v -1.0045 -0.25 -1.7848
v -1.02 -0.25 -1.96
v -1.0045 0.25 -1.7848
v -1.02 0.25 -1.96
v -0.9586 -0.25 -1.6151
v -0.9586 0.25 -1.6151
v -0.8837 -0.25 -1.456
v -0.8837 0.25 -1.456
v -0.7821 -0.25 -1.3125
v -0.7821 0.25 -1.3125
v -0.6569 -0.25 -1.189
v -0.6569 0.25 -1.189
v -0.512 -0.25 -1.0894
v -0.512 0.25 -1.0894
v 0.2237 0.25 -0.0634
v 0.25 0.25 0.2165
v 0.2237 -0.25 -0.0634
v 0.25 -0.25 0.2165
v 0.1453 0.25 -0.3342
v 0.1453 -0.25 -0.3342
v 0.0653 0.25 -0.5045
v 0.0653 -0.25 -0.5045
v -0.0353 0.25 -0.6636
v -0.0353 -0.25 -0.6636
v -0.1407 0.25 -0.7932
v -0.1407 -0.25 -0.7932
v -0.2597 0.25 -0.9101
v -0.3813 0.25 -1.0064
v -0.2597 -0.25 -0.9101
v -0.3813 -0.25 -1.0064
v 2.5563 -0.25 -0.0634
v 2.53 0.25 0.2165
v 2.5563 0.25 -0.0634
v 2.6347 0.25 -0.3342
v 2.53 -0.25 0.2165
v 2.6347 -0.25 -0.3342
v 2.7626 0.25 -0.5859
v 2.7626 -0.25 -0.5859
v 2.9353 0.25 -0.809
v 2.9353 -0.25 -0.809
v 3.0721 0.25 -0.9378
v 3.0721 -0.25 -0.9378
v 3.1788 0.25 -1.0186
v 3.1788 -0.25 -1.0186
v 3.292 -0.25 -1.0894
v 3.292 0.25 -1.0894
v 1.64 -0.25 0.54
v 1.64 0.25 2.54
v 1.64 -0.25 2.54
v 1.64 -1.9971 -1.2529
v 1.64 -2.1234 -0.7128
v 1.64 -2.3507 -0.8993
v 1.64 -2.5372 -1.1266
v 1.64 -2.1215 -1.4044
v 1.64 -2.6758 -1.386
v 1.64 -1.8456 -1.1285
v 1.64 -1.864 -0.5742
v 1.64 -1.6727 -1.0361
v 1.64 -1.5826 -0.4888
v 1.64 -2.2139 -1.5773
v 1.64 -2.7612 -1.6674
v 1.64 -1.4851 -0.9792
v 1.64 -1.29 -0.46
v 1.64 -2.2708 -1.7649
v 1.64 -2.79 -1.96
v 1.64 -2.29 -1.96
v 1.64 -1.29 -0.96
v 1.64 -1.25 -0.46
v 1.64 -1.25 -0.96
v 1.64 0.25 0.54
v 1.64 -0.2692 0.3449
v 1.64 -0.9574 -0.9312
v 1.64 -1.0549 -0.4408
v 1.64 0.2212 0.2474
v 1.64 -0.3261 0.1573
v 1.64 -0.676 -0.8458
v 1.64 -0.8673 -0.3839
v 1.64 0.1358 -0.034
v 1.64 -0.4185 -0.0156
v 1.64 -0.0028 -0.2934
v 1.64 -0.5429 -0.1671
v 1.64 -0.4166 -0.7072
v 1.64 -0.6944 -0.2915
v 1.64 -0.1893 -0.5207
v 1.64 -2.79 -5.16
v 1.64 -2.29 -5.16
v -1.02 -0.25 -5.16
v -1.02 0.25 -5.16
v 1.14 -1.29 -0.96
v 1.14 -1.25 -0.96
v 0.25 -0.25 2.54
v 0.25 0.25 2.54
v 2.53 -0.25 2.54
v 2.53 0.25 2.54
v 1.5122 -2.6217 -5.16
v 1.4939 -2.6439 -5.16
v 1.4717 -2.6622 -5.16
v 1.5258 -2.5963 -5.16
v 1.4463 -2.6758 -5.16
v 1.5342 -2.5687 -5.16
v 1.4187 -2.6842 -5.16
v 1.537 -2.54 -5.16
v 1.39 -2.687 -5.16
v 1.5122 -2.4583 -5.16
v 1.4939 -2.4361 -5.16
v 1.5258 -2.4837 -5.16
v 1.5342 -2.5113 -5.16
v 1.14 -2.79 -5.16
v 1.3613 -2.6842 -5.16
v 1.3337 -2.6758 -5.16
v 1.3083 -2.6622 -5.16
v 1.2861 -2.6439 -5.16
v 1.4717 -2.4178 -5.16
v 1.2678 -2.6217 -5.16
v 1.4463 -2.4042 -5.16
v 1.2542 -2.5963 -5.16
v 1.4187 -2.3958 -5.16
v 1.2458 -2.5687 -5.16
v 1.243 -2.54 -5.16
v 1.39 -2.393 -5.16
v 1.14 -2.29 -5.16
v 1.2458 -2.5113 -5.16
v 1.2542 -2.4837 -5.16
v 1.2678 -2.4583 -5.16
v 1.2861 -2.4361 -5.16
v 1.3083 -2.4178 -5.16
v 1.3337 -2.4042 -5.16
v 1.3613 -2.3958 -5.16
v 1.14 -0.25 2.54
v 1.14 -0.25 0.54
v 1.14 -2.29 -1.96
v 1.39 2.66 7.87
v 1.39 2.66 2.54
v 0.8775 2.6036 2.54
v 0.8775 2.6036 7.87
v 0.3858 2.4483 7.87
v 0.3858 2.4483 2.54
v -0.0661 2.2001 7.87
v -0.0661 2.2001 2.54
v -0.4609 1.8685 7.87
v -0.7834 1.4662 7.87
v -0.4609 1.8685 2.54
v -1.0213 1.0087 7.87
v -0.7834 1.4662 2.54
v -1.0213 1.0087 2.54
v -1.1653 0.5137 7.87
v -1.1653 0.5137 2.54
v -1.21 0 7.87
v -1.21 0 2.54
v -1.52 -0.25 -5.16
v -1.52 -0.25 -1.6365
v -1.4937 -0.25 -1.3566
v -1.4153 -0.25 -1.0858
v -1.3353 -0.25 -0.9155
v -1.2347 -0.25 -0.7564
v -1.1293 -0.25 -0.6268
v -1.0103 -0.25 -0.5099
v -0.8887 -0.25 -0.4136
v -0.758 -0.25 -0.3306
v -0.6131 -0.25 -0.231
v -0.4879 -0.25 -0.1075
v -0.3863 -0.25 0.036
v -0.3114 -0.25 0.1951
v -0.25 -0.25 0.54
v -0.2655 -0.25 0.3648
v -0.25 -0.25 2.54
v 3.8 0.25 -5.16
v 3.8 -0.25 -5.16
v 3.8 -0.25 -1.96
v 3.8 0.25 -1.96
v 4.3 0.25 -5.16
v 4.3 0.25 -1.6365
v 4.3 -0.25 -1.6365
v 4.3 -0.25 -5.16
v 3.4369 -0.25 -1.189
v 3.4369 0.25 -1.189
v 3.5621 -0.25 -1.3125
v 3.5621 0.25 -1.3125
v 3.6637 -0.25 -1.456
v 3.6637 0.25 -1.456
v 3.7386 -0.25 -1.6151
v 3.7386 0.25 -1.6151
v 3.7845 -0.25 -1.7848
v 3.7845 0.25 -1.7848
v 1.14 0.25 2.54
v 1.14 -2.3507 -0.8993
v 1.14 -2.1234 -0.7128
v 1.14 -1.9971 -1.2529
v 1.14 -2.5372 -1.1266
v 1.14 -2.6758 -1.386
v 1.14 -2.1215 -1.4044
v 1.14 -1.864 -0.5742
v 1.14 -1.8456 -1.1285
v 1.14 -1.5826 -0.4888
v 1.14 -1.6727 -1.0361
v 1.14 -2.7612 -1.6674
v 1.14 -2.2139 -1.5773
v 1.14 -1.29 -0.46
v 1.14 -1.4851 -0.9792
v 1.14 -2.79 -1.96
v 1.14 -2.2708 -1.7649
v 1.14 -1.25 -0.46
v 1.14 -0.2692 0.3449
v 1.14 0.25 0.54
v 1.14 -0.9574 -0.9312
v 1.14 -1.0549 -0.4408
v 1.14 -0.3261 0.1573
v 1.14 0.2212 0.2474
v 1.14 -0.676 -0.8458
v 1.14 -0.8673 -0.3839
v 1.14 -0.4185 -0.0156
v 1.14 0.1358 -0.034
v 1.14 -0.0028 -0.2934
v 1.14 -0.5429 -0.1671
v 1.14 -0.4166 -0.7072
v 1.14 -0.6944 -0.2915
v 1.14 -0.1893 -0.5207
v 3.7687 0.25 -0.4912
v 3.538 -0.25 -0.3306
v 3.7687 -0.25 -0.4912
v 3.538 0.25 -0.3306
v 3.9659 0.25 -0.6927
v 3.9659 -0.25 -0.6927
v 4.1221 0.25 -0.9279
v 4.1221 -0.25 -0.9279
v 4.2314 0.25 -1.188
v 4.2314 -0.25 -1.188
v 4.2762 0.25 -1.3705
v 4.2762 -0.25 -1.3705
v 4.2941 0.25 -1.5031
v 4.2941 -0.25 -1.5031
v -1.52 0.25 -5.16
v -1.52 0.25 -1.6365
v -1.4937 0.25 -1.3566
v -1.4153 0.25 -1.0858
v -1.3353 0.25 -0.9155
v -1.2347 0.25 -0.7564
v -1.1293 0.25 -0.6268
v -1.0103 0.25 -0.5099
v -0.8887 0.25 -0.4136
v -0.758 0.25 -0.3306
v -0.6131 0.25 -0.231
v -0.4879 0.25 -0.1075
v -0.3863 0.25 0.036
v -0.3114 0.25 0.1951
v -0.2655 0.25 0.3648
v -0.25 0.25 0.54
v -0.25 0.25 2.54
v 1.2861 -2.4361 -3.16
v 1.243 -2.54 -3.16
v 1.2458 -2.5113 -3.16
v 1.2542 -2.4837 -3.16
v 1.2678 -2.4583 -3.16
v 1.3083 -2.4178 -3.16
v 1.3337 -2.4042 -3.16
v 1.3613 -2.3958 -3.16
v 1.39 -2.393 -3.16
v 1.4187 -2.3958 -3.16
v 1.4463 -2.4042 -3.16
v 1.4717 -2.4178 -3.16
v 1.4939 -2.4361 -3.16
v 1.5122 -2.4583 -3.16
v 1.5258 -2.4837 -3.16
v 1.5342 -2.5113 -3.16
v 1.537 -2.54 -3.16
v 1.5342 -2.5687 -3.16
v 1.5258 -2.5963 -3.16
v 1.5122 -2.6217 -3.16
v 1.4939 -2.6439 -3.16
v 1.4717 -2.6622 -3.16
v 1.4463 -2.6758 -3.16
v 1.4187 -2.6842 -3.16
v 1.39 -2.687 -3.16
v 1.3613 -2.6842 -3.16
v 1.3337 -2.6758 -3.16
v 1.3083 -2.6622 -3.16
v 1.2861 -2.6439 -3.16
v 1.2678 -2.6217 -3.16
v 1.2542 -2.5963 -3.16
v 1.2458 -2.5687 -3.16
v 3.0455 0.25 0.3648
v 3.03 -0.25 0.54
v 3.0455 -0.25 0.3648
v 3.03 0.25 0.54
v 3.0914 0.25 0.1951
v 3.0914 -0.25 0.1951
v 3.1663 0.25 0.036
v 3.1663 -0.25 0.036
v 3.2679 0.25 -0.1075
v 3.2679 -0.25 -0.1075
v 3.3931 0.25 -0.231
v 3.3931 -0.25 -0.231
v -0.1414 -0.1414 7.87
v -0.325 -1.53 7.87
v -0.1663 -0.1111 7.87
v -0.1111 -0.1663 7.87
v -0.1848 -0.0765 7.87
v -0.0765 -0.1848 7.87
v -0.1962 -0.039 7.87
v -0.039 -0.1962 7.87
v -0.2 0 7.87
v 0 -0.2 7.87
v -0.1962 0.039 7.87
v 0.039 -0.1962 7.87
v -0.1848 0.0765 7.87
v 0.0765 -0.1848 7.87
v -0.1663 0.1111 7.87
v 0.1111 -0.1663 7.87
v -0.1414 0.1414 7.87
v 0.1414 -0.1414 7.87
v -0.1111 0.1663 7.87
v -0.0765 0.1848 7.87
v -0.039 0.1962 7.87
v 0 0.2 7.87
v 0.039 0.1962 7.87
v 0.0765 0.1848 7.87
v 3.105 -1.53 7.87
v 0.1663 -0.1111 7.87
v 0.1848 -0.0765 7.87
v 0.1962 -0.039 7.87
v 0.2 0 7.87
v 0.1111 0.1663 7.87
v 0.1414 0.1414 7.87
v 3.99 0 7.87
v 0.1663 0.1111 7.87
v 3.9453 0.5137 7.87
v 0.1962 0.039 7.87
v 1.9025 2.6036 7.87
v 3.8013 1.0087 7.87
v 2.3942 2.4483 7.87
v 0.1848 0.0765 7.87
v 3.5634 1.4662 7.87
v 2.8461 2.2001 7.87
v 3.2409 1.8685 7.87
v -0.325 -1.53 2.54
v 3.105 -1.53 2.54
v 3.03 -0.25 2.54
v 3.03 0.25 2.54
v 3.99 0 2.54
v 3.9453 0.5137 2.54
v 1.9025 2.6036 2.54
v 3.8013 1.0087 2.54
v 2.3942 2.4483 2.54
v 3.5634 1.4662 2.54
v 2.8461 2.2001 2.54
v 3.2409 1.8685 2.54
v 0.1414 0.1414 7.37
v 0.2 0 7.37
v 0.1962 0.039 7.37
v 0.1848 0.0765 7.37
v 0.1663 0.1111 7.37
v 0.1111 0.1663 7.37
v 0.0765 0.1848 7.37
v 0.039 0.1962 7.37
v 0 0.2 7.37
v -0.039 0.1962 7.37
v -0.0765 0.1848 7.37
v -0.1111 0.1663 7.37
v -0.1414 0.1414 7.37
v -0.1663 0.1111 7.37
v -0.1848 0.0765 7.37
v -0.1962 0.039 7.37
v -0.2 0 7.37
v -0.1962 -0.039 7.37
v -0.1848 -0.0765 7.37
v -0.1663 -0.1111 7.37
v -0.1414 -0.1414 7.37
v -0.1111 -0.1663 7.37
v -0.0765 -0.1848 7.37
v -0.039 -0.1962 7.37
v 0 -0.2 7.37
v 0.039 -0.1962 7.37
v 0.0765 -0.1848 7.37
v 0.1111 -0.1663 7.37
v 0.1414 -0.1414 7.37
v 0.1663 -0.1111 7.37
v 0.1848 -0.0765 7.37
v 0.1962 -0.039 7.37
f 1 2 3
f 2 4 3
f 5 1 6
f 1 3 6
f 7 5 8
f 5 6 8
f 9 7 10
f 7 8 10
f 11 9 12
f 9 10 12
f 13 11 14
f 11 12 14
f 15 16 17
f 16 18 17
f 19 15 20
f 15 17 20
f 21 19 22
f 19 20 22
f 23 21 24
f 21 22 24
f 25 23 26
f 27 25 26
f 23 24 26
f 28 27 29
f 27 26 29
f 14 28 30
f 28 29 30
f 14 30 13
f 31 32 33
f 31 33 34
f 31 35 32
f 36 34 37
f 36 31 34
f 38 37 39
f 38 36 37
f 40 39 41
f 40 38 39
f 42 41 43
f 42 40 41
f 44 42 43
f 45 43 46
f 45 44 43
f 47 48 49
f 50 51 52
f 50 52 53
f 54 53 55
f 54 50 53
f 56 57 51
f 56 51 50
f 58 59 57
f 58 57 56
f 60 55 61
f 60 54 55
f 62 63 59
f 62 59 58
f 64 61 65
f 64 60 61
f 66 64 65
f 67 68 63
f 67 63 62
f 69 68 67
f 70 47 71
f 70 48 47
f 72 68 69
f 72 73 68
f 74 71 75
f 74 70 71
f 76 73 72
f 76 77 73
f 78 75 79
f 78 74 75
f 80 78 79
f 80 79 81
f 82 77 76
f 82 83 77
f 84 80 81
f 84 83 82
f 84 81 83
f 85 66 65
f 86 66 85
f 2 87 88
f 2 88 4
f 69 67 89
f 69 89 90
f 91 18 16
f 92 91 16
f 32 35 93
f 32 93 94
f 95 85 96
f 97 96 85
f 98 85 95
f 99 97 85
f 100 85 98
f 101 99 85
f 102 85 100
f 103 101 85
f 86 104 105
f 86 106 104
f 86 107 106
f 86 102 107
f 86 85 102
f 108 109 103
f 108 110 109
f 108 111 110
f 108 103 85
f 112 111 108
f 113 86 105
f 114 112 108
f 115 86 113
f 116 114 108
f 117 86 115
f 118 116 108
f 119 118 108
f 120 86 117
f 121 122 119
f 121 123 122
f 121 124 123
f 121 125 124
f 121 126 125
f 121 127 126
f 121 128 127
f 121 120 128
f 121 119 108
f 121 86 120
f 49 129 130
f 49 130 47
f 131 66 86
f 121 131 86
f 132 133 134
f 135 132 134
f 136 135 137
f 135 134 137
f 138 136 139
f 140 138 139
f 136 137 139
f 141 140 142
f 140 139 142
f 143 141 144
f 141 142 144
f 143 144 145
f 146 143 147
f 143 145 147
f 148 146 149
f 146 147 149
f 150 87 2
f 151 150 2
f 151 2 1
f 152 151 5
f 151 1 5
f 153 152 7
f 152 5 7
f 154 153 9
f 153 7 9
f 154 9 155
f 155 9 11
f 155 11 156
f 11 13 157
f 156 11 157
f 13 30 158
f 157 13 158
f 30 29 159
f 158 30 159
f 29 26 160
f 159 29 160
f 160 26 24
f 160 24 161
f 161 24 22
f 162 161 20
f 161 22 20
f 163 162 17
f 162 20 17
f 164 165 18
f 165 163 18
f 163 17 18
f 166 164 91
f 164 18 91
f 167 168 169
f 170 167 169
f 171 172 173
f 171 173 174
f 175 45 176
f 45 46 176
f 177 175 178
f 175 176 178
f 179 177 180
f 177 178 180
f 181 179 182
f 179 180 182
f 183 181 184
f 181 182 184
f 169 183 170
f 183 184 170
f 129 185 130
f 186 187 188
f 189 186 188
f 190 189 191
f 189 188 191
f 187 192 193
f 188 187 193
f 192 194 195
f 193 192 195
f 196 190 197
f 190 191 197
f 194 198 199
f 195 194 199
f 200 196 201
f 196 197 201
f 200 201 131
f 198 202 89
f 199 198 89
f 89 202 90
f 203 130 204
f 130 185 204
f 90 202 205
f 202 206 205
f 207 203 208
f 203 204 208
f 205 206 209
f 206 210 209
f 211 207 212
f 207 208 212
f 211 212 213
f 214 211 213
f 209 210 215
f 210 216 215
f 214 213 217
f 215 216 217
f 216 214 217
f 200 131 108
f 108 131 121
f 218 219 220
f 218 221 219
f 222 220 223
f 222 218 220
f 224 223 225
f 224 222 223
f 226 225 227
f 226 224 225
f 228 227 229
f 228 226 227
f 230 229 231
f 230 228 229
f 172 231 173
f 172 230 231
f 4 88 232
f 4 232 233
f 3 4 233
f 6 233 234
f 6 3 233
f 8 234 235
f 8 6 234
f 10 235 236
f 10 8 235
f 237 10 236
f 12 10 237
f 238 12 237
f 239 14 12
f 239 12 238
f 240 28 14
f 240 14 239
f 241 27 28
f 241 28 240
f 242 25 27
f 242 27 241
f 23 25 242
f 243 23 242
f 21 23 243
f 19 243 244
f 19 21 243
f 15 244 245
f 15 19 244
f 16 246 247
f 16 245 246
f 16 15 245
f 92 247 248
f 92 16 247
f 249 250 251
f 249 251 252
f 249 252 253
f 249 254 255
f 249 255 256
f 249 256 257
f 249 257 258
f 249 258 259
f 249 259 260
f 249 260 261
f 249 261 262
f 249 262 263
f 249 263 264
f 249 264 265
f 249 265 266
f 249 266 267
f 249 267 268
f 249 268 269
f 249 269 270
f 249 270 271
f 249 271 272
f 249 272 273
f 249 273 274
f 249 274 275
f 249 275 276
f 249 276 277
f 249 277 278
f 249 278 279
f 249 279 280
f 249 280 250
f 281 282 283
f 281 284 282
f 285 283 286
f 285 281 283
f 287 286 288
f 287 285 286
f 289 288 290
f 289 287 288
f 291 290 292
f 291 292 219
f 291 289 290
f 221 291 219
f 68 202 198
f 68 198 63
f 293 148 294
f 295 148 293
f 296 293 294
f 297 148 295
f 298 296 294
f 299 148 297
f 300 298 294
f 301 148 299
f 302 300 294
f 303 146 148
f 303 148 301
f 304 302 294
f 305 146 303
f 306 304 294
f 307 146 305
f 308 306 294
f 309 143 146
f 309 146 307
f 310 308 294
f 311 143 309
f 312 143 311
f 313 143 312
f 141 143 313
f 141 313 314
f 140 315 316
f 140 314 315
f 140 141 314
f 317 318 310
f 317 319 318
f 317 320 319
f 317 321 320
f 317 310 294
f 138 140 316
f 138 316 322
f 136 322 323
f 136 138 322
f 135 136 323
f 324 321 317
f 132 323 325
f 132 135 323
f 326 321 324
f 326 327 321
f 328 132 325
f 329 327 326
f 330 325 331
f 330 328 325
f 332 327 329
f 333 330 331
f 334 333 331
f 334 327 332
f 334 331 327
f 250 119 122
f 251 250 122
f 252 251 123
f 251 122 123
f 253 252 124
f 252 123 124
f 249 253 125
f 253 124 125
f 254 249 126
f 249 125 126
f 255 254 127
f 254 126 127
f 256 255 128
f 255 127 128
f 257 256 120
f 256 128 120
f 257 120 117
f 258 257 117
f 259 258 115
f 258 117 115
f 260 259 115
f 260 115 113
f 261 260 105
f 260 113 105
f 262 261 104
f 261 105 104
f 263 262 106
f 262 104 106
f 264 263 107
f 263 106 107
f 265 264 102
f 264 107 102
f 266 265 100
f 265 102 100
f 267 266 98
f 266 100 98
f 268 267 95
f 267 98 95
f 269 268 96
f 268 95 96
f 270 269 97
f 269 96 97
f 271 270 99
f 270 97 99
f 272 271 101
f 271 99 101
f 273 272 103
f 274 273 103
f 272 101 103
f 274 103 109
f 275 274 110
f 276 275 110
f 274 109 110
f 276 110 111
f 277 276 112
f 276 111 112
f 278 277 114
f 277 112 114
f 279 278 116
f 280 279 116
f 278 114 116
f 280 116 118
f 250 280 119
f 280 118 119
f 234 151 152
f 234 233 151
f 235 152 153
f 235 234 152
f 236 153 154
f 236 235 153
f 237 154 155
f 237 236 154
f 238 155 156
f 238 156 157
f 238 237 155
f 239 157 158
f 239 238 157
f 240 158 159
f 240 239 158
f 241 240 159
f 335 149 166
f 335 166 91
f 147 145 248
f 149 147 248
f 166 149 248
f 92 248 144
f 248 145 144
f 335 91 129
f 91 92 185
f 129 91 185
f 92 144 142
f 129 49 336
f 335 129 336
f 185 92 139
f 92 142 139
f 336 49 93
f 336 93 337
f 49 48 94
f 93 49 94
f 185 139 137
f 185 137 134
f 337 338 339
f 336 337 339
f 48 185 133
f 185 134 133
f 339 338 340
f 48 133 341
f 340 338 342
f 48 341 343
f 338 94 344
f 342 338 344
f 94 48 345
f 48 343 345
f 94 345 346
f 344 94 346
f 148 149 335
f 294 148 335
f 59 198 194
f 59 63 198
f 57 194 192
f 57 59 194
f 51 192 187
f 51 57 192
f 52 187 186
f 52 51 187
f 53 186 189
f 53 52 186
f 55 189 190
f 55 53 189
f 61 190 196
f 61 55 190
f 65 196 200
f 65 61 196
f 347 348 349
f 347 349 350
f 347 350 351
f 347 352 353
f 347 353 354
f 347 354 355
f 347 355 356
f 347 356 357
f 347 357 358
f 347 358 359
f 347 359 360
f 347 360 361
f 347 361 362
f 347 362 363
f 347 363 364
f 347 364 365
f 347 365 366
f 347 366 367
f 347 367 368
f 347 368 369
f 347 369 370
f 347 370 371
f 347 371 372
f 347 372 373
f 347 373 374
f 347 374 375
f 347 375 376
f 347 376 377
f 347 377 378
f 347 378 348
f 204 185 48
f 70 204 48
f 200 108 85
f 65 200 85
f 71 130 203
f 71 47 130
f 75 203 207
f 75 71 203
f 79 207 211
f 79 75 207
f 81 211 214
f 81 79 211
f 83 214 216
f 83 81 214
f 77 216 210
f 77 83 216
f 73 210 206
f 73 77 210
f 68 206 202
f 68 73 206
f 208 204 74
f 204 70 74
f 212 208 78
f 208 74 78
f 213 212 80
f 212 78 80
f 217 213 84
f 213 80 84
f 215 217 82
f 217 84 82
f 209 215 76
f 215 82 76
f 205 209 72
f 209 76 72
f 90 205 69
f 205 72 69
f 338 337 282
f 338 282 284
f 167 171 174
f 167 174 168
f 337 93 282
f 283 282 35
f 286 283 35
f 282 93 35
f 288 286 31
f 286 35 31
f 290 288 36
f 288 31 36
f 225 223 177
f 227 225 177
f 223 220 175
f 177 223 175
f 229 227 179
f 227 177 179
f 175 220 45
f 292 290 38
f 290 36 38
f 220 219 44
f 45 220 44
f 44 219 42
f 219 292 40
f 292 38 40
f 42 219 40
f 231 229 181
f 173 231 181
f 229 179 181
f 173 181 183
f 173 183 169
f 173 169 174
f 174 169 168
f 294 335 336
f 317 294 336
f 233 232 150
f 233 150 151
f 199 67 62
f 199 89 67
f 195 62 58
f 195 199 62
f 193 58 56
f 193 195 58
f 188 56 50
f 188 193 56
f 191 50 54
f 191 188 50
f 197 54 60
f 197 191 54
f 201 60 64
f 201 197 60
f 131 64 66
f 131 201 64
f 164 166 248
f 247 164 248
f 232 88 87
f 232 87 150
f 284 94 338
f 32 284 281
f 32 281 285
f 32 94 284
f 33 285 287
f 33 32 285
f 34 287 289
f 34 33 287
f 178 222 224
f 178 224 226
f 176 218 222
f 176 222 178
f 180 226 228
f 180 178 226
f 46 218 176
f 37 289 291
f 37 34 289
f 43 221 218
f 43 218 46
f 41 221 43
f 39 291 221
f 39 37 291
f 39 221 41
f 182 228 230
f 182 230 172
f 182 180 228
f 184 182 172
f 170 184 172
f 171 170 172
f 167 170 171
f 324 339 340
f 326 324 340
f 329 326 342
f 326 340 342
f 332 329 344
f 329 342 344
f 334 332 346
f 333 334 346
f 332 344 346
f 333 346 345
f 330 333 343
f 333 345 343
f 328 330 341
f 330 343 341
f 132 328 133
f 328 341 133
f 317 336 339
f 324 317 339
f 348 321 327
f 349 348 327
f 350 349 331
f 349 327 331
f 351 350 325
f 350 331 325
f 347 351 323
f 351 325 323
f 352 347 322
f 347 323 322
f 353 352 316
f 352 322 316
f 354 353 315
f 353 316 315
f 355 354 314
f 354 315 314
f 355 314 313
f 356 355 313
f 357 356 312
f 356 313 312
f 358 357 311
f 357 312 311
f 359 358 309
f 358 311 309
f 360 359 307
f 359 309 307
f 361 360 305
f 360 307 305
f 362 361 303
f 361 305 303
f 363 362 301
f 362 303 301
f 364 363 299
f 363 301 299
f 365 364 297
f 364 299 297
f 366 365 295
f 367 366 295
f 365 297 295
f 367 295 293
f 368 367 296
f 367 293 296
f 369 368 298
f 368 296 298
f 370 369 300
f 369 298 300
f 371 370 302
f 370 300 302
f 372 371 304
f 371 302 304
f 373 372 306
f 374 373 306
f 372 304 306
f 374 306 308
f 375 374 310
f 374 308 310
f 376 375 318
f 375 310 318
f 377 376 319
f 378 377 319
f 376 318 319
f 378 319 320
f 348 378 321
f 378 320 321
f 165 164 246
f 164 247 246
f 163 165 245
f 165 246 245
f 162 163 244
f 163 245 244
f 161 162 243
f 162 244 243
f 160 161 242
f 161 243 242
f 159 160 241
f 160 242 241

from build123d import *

# Parameters (mm, degrees)
EXTRUDE_1_DEPTH     = 5.33
SKETCH_1_W          = 0.5
SKETCH_1_H          = 0.5
EXTRUDE_2_DEPTH     = 2.54
SKETCH_1_2_W        = 0.5
SKETCH_1_2_H        = 0.5
EXTRUDE_3_DEPTH     = 10.16
SKETCH_4_R          = 0.2
CUT_EXTRUDE_1_DEPTH = 0.5
SKETCH_5_W          = 9.7
SKETCH_5_H          = 0.5
EXTRUDE_4_DEPTH     = 1.27
SKETCH_6_W          = 9.7
SKETCH_6_H          = 0.5
EXTRUDE_5_DEPTH     = 1.27
SKETCH_7_W          = 0.5
SKETCH_7_H          = 9.7
EXTRUDE_6_DEPTH     = 2.54
SKETCH_8_W          = 1.372733762
SKETCH_8_H          = 9.815585296
CUT_EXTRUDE_2_DEPTH = 2.54
SKETCH_9_W          = 9.522444549
SKETCH_9_H          = 3.637804143
CUT_EXTRUDE_3_DEPTH = 1
FILLET_1_R          = 1
FILLET_2_R          = 1.5
SKETCH_10_W         = 0.5
SKETCH_10_H         = 0.5
CUT_EXTRUDE_4_DEPTH = 5
SKETCH_11_R         = 0.1469903
CUT_EXTRUDE_5_DEPTH = 2


with BuildPart() as part:
    # Эскиз3 → Вытянуть1 (new body)
    with BuildSketch(Plane.XY.offset(2.54)):
        with BuildLine():
            Line((-0.325, -1.53), (3.105, -1.53))
            Line((3.105, -1.53), (3.99, 0))
            ThreePointArc((3.99, 0), (3.240904038, 1.868477631), (1.39, 2.66))
            ThreePointArc((1.39, 2.66), (-0.460904038, 1.868477631), (-1.21, 0))
            Line((-1.21, 0), (-0.325, -1.53))
        make_face()
    extrude(amount=EXTRUDE_1_DEPTH)

    # Эскиз1 → Вытянуть2 (add)
    with BuildSketch(Plane.XY):
        with Locations((1.39, 0)):
            Rectangle(SKETCH_1_W, SKETCH_1_H)
        Rectangle(SKETCH_1_W, SKETCH_1_H)
        with Locations((2.78, 0)):
            Rectangle(SKETCH_1_W, SKETCH_1_H)
    extrude(amount=EXTRUDE_2_DEPTH)

    # Эскиз1<2> → Вытянуть3 (add)
    with BuildSketch(Plane.XY):
        with Locations((1.39, 0)):
            Rectangle(SKETCH_1_2_W, SKETCH_1_2_H)
        Rectangle(SKETCH_1_2_W, SKETCH_1_2_H)
        with Locations((2.78, 0)):
            Rectangle(SKETCH_1_2_W, SKETCH_1_2_H)
    extrude(amount=-EXTRUDE_3_DEPTH)

    # Эскиз4 → Вырез-Вытянуть1 (cut)
    with BuildSketch(Plane.XY.offset(7.87)):
        Circle(SKETCH_4_R)
    extrude(amount=-CUT_EXTRUDE_1_DEPTH, mode=Mode.SUBTRACT)

    # Эскиз5 → Вытянуть4 (add)
    with BuildSketch(Plane(origin=(3.03, 0, 0), x_dir=(0, 0, -1), z_dir=(1, 0, 0))):
        with Locations((5.31, 0)):
            Rectangle(SKETCH_5_W, SKETCH_5_H)
    extrude(amount=EXTRUDE_4_DEPTH)

    # Эскиз6 → Вытянуть5 (add)
    with BuildSketch(Plane.ZY.offset(0.25)):
        with Locations((-5.31, 0)):
            Rectangle(SKETCH_6_W, SKETCH_6_H)
    extrude(amount=EXTRUDE_5_DEPTH)

    # Эскиз7 → Вытянуть6 (add)
    with BuildSketch(Plane(origin=(0, -0.25, 0), x_dir=(1, 0, 0), z_dir=(0, 1, 0))):
        with Locations((1.39, 5.31)):
            Rectangle(SKETCH_7_W, SKETCH_7_H)
    extrude(amount=-EXTRUDE_6_DEPTH)

    # Эскиз8 → Вырез-Вытянуть2 (cut)
    with BuildSketch(Plane.XZ.offset(0.25)):
        with Locations((-0.333633119, -5.867792648)):
            Rectangle(SKETCH_8_W, SKETCH_8_H)
        with Locations((3.113633119, -5.867792648)):
            Rectangle(SKETCH_8_W, SKETCH_8_H)
    extrude(amount=-CUT_EXTRUDE_2_DEPTH, mode=Mode.SUBTRACT)

    # Эскиз9 → Вырез-Вытянуть3 (cut)
    with BuildSketch(Plane(origin=(1.64, 0, 0), x_dir=(0, 0, -1), z_dir=(1, 0, 0))):
        with Locations((5.721222275, -0.471097928)):
            Rectangle(SKETCH_9_W, SKETCH_9_H)
    extrude(amount=-CUT_EXTRUDE_3_DEPTH, mode=Mode.SUBTRACT)

    # Скругление1
    fillet_1_edges = [part.edges().sort_by_distance(p)[0] for p in [
        (-1.02, 0, -0.96),
        (1.39, -2.29, -0.96),
        (3.8, 0, -0.96),
        (3.03, 0, -0.46),
        (1.39, -0.25, -0.46),
        (-0.25, 0, -0.46),
    ]]
    fillet(fillet_1_edges, radius=FILLET_1_R)

    # Скругление2
    fillet_2_edges = [part.edges().sort_by_distance(p)[0] for p in [
        (-1.52, 0, -0.46),
        (1.39, -2.79, -0.46),
        (4.3, 0, -0.46),
        (0.25, 0, -0.96),
        (1.39, 0.25, -0.96),
        (2.53, 0, -0.96),
    ]]
    fillet(fillet_2_edges, radius=FILLET_2_R)

    # Эскиз10 → Вырез-Вытянуть4 (cut)
    with BuildSketch(Plane(origin=(0, 0, -10.16), x_dir=(-1, 0, 0), z_dir=(0, 0, -1))):
        with Locations((-1.39, -2.54)):
            Rectangle(SKETCH_10_W, SKETCH_10_H)
        with Locations((1.27, 0)):
            Rectangle(SKETCH_10_W, SKETCH_10_H)
        with Locations((-4.05, 0)):
            Rectangle(SKETCH_10_W, SKETCH_10_H)
    extrude(amount=-CUT_EXTRUDE_4_DEPTH, mode=Mode.SUBTRACT)

    # Эскиз11 → Вырез-Вытянуть5 (cut)
    with BuildSketch(Plane(origin=(0, 0, -5.16), x_dir=(-1, 0, 0), z_dir=(0, 0, -1))):
        with Locations((-1.39, -2.54)):
            Circle(SKETCH_11_R)
    extrude(amount=-CUT_EXTRUDE_5_DEPTH, mode=Mode.SUBTRACT)


solid = part.part
